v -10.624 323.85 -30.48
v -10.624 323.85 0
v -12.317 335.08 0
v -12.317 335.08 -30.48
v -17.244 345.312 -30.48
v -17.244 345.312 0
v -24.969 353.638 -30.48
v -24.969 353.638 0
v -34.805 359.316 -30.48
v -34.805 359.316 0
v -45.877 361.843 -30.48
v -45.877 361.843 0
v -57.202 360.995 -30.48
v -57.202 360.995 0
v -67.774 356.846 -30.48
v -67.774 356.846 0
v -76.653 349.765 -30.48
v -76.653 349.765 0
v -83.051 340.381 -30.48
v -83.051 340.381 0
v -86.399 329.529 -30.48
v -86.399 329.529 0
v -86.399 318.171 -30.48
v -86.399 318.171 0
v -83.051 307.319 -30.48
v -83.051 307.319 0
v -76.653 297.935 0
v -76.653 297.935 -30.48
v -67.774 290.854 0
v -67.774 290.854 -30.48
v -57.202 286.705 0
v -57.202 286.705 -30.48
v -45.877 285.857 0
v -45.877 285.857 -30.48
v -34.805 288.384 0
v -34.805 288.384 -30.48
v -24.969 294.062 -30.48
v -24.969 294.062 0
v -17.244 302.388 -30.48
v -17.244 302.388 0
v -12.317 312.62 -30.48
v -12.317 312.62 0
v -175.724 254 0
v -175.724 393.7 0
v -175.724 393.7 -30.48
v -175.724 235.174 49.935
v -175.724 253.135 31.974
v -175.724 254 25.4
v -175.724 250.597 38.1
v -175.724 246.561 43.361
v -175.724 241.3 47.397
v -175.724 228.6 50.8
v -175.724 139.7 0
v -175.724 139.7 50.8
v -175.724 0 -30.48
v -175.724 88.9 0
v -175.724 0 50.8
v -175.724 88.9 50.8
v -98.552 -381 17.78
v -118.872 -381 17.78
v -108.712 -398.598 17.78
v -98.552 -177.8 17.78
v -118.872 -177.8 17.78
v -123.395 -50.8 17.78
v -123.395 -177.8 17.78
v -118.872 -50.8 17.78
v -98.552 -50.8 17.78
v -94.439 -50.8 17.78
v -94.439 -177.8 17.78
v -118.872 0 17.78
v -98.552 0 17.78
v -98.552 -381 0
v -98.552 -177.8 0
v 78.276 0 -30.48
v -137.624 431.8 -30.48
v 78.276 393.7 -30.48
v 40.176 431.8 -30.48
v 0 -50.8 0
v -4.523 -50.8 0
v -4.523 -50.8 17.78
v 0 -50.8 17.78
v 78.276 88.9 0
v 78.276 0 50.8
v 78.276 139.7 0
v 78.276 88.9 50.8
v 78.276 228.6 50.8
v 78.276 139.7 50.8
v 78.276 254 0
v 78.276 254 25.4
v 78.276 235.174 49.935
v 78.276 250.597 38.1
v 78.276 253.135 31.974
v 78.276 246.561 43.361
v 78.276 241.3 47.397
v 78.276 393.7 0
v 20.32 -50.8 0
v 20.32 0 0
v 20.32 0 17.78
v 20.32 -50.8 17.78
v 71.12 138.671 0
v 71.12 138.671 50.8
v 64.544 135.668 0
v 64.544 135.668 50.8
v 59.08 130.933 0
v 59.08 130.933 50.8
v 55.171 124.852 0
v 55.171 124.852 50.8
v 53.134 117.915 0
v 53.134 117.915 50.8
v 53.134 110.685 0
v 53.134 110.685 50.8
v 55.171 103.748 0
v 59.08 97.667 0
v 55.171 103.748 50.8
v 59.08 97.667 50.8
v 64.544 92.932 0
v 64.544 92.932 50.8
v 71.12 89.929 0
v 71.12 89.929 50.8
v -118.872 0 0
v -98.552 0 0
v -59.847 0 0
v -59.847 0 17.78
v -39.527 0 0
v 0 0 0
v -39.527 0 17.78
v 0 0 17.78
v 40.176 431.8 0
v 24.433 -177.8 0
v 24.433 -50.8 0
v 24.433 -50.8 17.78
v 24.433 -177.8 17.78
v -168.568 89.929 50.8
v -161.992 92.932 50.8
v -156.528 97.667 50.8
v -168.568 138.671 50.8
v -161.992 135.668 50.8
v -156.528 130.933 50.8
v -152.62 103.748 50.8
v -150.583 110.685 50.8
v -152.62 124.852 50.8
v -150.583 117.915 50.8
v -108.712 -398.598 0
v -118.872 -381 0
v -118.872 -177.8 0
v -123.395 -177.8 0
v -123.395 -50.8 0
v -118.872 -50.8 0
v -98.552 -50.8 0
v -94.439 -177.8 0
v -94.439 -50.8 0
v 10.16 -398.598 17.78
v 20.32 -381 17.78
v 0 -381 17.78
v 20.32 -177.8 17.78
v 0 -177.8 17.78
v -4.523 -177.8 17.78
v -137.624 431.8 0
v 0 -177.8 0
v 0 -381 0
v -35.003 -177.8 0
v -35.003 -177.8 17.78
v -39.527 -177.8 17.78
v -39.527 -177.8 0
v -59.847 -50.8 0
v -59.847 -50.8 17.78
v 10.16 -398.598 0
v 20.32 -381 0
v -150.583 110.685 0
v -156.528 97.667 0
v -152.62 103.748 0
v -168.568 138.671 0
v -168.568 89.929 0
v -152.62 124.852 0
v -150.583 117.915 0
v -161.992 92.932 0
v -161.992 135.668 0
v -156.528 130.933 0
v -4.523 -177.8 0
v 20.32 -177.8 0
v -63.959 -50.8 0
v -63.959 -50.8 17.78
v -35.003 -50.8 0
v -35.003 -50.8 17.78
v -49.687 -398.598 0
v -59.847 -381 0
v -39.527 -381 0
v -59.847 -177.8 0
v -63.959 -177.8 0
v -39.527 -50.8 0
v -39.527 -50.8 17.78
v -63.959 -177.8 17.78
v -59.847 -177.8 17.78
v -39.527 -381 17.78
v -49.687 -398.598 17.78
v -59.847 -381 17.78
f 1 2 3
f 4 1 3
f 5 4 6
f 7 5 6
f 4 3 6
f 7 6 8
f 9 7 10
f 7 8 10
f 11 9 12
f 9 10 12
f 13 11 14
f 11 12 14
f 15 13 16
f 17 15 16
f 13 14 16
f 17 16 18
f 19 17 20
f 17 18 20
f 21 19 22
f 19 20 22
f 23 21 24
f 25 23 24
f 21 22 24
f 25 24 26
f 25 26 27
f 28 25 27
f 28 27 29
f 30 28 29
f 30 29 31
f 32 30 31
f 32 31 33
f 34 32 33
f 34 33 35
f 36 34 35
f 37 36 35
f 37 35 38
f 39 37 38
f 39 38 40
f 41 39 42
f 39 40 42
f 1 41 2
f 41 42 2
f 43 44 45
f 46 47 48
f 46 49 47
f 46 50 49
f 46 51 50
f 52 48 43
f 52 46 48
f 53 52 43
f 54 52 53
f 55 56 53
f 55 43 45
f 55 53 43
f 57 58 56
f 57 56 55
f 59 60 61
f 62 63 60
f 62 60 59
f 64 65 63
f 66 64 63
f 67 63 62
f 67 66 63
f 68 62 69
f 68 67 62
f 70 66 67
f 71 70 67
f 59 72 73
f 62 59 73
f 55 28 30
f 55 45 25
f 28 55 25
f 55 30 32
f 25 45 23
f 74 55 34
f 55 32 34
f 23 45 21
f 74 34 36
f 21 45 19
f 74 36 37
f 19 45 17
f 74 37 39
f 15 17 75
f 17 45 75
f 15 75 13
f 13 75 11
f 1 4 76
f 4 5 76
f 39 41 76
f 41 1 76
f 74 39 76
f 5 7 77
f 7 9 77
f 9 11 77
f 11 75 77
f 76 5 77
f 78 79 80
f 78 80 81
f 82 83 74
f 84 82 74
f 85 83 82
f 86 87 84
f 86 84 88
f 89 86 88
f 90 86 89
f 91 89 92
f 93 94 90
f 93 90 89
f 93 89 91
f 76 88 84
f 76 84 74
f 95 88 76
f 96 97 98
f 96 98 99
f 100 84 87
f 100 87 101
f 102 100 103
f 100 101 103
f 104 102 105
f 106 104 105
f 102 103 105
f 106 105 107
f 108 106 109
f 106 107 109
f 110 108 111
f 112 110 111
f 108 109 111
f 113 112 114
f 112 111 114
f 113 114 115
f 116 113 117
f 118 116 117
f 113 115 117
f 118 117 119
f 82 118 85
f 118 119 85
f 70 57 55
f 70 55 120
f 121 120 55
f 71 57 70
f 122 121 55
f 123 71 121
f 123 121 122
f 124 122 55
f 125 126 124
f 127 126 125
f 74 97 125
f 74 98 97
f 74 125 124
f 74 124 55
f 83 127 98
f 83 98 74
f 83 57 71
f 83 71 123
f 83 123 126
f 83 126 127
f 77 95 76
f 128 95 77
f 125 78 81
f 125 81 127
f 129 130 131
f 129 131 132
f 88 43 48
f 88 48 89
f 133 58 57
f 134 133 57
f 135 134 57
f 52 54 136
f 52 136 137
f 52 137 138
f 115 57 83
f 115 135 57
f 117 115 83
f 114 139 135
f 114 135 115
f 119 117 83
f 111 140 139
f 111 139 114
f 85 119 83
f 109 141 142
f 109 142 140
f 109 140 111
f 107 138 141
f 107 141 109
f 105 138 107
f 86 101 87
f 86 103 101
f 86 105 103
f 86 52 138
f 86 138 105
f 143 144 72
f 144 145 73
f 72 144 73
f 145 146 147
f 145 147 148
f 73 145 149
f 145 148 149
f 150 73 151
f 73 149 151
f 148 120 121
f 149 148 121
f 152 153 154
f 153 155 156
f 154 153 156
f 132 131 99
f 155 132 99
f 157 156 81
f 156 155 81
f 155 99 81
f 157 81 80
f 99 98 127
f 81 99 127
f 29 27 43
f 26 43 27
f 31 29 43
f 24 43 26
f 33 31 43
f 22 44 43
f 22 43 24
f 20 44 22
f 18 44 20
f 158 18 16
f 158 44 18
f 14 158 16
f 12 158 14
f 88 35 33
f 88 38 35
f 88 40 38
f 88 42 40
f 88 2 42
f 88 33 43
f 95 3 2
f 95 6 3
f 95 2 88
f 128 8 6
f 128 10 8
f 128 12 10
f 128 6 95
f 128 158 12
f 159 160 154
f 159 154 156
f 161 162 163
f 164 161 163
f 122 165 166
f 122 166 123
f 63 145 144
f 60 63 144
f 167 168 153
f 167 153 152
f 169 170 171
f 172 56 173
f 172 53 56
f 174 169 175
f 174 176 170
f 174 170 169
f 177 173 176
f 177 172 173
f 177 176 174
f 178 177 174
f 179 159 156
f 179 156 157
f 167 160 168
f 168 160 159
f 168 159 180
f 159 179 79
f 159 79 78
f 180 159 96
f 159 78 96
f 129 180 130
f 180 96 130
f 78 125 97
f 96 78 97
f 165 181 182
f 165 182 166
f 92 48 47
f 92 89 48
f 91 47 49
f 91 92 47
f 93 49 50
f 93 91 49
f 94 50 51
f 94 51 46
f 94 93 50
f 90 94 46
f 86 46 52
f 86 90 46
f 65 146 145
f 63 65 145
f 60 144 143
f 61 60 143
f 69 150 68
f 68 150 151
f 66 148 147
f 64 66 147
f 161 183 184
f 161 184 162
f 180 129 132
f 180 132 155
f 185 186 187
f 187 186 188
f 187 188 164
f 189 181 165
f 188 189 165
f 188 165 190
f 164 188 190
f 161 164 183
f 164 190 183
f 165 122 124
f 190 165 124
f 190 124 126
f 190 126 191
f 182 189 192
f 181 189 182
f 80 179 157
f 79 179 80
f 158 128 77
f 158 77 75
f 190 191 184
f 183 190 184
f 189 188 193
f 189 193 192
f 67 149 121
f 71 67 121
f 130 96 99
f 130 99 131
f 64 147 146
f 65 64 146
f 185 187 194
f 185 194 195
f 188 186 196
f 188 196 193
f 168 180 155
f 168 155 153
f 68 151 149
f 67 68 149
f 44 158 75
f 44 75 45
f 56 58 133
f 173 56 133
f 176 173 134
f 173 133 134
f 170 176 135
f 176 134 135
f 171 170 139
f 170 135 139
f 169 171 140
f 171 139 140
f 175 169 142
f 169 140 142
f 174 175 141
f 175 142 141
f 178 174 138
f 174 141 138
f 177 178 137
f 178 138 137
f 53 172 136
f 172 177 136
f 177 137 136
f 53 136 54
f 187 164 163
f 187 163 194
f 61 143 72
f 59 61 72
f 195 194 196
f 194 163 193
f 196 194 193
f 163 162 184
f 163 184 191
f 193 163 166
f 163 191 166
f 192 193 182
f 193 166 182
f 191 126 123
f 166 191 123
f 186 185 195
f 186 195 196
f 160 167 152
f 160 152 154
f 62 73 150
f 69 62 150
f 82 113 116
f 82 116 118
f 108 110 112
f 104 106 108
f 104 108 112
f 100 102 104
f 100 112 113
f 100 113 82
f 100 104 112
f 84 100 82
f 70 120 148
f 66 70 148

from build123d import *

# Parameters (mm, degrees)
BOSS_EXTRUDE1_DEPTH   = 17.78
BOSS_EXTRUDE1_2_DEPTH = 17.78
BOSS_EXTRUDE1_3_DEPTH = 17.78
SKETCH2_W             = 254
SKETCH2_H             = 254
BOSS_EXTRUDE2_DEPTH   = 50.8
FILLET1_R             = 25.4
SKETCH3_R             = 25.4
CUT_EXTRUDE1_DEPTH    = 50.8
BOSS_EXTRUDE3_DEPTH   = 30.48
SKETCH5_R             = 38.1
CUT_EXTRUDE2_DEPTH    = 30.48


with BuildPart() as part:
    # Sketch1 → Boss-Extrude1 (new body)
    with BuildSketch(Plane.XY):
        Polygon((0, 0), (20.32, 0), (20.32, -50.8), (24.432509982, -50.8), (24.432509982, -177.8), (20.32, -177.8), (20.32, -381), (10.16, -398.597636205), (0, -381), (0, -177.8), (-4.523490018, -177.8), (-4.523490018, -50.8), (0, -50.8), align=None)
    extrude(amount=BOSS_EXTRUDE1_DEPTH)



with BuildPart() as body_2:
    # Sketch1 → Boss-Extrude1 2 (new body)
    with BuildSketch(Plane.XY):
        Polygon((-59.846980035, -50.8), (-59.846980035, 0), (-39.526980035, 0), (-39.526980035, -50.8), (-35.003490018, -50.8), (-35.003490018, -177.8), (-39.526980035, -177.8), (-39.526980035, -381), (-49.686980035, -398.597636205), (-59.846980035, -381), (-59.846980035, -177.8), (-63.959490018, -177.8), (-63.959490018, -50.8), align=None)
    extrude(amount=BOSS_EXTRUDE1_2_DEPTH)


with BuildPart() as body_3:
    # Sketch1 → Boss-Extrude1 3 (new body)
    with BuildSketch(Plane.XY):
        Polygon((-118.872, -381), (-108.712, -398.597636205), (-98.552, -381), (-98.552, -177.8), (-94.439490018, -177.8), (-94.439490018, -50.8), (-98.552, -50.8), (-98.552, 0), (-118.872, 0), (-118.872, -50.8), (-123.395490018, -50.8), (-123.395490018, -177.8), (-118.872, -177.8), align=None)
    extrude(amount=BOSS_EXTRUDE1_3_DEPTH)


with BuildPart() as part_1:
    add(part.part)

    add(body_2.part)  # Boss-Extrude2 merges body 2

    add(body_3.part)  # Boss-Extrude2 merges body 3
    # Sketch2 → Boss-Extrude2 (add)
    with BuildSketch(Plane.XY):
        with Locations((-48.724161458, 127)):
            Rectangle(SKETCH2_W, SKETCH2_H)
    extrude(amount=BOSS_EXTRUDE2_DEPTH)

    # Fillet1
    fillet1_edges = [part_1.edges().sort_by_distance(p)[0] for p in [
        (-48.724161458, 254, 50.8),
    ]]
    fillet(fillet1_edges, radius=FILLET1_R)

    # Sketch3 → Cut-Extrude1 (cut)
    with BuildSketch(Plane.XY.offset(50.8)):
        with Locations((-175.724161458, 114.3)):
            Circle(SKETCH3_R)
        with Locations((78.275838542, 114.3)):
            Circle(SKETCH3_R)
    extrude(amount=-CUT_EXTRUDE1_DEPTH, mode=Mode.SUBTRACT)

    # Sketch4 → Boss-Extrude3 (add)
    with BuildSketch(Plane(origin=(0, 0, 0), x_dir=(-1, 0, 0), z_dir=(0, 0, -1))):
        Polygon((-78.275838542, 393.7), (-40.175838542, 431.8), (137.624161458, 431.8), (175.724161458, 393.7), (175.724161458, 0), (-78.275838542, 0), align=None)
    extrude(amount=BOSS_EXTRUDE3_DEPTH)

    # Sketch5 → Cut-Extrude2 (cut)
    with BuildSketch(Plane.XY):
        with Locations((-48.724161458, 323.85)):
            Circle(SKETCH5_R)
    extrude(amount=-CUT_EXTRUDE2_DEPTH, mode=Mode.SUBTRACT)


solid = part_1.part
